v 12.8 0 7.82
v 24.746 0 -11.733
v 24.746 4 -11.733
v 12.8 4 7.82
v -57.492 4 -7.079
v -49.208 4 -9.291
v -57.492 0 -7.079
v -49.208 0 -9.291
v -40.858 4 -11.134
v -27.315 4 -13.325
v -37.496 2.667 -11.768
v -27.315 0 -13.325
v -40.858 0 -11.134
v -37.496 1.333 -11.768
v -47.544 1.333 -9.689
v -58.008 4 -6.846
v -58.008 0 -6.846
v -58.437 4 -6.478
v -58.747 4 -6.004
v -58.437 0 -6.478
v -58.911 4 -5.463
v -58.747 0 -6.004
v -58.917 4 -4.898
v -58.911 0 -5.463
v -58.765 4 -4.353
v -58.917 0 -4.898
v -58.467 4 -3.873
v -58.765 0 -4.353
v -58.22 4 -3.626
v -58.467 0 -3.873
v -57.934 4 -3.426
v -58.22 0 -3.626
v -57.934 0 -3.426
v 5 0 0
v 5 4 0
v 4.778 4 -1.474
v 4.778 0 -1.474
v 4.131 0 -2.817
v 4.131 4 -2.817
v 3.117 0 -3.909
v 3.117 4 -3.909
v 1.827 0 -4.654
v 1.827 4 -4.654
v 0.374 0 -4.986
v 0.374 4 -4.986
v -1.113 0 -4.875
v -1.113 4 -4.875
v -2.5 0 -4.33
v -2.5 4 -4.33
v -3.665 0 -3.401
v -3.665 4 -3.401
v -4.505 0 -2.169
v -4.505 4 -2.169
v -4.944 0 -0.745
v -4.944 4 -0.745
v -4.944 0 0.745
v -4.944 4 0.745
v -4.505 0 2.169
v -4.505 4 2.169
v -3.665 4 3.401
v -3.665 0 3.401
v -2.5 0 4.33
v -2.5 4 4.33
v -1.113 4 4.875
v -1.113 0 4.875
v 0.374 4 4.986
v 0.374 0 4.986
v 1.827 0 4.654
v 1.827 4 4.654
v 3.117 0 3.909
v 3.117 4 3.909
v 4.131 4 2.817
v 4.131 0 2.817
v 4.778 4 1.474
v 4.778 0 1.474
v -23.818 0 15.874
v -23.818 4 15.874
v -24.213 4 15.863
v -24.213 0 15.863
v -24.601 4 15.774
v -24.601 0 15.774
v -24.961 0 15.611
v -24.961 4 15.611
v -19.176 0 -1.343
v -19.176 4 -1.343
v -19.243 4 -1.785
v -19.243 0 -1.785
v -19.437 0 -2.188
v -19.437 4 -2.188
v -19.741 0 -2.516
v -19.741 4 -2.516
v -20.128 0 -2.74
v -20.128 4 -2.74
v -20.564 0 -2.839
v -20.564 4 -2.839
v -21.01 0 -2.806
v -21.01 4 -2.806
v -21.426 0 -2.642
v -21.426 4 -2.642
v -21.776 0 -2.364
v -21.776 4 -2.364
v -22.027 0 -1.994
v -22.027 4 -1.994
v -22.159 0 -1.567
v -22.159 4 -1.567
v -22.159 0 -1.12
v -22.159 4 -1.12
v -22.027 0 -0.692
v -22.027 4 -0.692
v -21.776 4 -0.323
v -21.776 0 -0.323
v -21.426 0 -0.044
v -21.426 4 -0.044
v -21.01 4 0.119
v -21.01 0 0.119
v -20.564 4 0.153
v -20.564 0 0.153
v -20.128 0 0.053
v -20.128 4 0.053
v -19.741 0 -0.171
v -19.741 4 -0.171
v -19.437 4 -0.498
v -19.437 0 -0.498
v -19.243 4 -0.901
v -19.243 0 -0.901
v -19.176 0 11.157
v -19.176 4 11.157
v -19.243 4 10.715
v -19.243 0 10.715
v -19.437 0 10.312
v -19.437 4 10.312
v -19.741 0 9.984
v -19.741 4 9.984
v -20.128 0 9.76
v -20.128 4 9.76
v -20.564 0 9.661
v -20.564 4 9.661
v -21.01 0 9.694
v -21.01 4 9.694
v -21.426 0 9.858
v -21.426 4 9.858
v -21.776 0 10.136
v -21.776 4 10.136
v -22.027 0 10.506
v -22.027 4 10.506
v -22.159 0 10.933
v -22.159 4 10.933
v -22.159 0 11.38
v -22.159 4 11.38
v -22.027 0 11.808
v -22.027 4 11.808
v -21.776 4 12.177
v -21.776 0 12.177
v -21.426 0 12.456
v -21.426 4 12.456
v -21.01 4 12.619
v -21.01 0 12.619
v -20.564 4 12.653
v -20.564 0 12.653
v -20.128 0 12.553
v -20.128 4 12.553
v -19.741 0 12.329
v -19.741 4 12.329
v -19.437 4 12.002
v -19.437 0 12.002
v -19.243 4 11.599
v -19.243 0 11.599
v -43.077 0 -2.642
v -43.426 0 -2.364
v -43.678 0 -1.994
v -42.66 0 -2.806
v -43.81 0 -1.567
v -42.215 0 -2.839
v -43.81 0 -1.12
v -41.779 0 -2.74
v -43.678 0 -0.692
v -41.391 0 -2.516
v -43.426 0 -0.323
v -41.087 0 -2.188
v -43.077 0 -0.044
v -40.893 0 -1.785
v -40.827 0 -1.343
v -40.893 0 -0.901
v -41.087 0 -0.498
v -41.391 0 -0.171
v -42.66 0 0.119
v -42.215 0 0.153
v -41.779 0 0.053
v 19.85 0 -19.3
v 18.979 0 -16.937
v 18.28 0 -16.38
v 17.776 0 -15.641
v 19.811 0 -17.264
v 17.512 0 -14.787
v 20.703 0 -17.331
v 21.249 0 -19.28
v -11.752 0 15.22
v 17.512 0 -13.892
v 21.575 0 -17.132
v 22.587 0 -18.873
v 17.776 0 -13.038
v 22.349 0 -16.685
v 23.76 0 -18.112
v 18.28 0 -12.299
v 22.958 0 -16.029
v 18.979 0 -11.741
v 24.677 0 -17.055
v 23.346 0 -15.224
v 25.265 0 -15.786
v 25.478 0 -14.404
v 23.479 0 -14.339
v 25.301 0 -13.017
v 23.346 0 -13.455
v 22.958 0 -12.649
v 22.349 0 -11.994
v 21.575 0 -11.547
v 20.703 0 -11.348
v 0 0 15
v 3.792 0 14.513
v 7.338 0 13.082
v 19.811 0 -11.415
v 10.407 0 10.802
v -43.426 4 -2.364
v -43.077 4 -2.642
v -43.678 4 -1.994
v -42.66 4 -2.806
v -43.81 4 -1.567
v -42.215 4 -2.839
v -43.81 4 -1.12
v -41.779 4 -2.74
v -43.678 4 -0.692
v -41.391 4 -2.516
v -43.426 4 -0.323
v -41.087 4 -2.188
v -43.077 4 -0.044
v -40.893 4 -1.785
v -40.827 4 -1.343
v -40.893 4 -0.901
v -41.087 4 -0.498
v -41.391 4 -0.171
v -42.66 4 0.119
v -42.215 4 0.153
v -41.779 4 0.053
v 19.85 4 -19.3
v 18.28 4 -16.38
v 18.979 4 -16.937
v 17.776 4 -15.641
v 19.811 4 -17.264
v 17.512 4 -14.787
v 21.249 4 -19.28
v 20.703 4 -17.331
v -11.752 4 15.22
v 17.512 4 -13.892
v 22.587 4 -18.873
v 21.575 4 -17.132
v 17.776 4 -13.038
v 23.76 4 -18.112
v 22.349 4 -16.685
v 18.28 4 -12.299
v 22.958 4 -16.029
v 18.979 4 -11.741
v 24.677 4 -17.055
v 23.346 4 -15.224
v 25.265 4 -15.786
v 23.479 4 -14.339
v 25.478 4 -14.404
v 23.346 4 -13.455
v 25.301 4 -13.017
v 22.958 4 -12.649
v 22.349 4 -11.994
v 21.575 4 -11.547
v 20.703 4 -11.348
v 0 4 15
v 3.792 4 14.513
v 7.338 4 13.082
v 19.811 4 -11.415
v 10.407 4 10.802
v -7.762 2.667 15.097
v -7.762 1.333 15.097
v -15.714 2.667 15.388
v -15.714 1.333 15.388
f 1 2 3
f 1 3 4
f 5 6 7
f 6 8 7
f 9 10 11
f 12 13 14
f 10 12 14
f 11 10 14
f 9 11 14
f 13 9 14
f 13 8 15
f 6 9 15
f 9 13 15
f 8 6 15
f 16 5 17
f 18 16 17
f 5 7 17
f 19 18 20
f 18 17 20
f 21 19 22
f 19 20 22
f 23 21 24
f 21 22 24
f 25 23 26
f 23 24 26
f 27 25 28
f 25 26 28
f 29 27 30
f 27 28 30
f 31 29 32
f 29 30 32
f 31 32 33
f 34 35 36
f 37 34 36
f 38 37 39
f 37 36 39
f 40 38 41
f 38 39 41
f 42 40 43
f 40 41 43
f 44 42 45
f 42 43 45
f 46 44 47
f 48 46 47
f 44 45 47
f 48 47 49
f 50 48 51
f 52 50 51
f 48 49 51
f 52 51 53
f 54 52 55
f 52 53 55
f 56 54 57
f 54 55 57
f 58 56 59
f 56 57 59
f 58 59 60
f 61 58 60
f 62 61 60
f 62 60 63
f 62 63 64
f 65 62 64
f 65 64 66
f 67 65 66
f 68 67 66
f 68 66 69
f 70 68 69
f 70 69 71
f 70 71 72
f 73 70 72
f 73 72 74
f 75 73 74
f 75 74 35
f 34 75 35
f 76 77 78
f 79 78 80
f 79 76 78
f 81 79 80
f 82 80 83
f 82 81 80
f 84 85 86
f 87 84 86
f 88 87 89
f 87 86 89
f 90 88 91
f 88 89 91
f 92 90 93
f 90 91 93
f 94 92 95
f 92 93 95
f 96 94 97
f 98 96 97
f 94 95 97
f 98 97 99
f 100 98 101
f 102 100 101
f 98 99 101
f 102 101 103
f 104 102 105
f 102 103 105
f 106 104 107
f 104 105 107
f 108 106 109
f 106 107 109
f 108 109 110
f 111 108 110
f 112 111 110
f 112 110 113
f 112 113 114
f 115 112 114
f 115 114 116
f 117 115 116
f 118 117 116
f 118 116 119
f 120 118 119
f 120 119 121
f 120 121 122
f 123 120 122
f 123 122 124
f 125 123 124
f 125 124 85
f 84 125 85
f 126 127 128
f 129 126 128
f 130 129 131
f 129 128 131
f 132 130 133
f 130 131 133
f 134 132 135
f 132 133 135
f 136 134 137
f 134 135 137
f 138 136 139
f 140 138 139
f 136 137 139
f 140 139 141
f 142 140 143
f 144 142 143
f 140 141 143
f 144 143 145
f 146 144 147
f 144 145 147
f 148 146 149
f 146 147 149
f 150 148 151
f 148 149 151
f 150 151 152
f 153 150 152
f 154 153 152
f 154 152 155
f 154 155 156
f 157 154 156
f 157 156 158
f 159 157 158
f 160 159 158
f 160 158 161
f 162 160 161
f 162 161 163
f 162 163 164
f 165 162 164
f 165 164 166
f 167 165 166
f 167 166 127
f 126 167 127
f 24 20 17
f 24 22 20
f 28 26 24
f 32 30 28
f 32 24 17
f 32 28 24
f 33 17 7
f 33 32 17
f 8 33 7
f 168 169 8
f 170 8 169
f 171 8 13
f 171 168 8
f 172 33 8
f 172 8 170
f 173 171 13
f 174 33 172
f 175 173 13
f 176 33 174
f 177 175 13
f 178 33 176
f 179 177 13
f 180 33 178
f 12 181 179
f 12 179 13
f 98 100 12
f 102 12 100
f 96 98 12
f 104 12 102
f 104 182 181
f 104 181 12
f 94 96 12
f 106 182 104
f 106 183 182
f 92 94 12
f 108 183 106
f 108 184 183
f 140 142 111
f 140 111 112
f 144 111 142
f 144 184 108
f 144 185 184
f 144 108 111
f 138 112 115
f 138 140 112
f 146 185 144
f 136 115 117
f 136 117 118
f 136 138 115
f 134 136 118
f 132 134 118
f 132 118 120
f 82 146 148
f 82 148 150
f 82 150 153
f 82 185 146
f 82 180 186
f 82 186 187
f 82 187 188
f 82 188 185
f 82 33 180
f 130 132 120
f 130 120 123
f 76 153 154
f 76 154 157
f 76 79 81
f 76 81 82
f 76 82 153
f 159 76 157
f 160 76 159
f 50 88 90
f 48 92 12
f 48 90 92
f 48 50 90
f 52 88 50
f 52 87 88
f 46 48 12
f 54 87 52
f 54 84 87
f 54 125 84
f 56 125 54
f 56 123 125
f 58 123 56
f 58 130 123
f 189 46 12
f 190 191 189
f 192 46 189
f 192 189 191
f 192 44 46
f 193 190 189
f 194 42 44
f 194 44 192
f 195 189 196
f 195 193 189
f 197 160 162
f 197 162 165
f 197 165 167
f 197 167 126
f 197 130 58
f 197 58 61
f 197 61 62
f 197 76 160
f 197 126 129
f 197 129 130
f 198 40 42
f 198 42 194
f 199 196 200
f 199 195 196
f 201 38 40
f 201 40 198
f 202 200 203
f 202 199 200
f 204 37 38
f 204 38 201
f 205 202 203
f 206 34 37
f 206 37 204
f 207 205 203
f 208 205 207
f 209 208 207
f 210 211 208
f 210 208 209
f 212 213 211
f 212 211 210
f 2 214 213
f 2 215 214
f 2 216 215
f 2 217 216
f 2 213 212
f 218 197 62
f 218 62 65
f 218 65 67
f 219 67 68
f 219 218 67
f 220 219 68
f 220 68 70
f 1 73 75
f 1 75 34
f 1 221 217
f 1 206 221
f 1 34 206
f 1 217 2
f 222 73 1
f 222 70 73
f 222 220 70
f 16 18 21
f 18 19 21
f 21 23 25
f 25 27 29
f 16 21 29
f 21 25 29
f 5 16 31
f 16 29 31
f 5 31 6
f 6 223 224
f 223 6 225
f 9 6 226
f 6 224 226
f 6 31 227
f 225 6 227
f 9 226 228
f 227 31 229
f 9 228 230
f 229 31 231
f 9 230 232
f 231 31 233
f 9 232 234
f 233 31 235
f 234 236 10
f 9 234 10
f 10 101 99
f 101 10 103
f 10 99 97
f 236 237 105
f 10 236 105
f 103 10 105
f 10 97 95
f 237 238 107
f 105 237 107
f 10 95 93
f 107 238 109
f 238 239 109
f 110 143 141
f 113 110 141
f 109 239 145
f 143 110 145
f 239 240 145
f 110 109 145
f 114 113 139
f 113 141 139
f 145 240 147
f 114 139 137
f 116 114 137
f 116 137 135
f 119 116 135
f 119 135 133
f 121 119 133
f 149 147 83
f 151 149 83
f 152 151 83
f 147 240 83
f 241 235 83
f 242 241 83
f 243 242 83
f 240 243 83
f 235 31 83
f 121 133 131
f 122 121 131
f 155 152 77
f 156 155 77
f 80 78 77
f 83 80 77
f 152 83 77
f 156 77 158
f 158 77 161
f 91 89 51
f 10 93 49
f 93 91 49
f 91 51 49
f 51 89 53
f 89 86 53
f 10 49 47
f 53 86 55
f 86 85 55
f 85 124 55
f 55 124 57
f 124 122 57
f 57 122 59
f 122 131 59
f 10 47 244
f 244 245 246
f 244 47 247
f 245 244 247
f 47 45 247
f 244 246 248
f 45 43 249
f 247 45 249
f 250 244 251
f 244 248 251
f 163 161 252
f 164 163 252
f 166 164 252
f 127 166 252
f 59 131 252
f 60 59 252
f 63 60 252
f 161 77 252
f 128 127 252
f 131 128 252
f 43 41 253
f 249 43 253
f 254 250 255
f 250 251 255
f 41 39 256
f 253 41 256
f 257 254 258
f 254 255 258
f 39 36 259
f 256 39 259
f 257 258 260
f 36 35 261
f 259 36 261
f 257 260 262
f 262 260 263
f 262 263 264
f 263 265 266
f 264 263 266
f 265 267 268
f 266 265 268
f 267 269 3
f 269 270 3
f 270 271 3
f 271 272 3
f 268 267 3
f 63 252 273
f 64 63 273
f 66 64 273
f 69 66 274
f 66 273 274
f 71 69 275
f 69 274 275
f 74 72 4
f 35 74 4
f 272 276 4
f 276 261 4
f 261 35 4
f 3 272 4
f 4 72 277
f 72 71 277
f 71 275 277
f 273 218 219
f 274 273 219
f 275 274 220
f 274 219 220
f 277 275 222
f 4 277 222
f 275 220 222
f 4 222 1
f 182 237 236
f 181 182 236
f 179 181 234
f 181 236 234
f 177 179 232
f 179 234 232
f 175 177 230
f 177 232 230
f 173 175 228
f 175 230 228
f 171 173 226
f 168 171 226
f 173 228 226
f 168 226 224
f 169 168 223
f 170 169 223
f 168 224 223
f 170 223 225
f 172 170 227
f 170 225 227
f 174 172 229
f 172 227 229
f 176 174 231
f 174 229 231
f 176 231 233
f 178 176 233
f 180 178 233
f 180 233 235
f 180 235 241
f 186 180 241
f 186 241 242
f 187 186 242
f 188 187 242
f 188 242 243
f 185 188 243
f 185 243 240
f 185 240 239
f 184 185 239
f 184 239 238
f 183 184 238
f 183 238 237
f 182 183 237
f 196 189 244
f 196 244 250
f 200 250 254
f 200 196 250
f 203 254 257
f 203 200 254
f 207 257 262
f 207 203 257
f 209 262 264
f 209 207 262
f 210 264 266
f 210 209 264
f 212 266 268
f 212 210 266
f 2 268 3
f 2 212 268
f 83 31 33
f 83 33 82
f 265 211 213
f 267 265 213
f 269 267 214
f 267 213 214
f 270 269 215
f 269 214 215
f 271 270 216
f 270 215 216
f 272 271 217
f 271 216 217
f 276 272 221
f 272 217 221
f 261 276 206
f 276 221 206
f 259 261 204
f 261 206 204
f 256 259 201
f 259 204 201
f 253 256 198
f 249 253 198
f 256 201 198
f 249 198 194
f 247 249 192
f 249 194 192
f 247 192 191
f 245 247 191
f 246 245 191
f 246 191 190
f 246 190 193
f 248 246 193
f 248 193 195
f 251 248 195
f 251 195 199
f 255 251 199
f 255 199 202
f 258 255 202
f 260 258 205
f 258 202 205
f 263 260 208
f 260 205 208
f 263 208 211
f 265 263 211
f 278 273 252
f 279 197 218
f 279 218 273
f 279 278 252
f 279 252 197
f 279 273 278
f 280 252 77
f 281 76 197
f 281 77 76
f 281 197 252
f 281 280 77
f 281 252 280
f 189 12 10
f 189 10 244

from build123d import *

# Parameters (mm, degrees)
SKETCH1_R           = 1.5
BOSS_EXTRUDE4_DEPTH = 4
SKETCH2_R           = 3
BOSS_EXTRUDE6_DEPTH = 4
CUT_EXTRUDE4_DEPTH  = 5.0000001
FILLET4_R           = 2
SKETCH7_R           = 5
SKETCH7_R_2         = 1.5
CUT_EXTRUDE3_DEPTH  = 10


with BuildPart() as part:
    # Sketch1 → Boss-Extrude4 (new body)
    with BuildSketch(Plane(origin=(0, 0, 0), x_dir=(1, 0, 0), z_dir=(0, 1, 0))):
        with BuildLine():
            add(Edge.make_bspline(
                [(0, 15), (-53.333333333, 15), (-97.583223813, -2.850327116), (-150.232513174, -43.74649777)],
                knots=[0, 0, 0, 0, 1, 1, 1, 1], degree=3))
            Line((-150.232513174, -43.74649777), (-144.167389057, -51.554673195))
            add(Edge.make_bspline(
                [(0, -15), (-49.211171611, -15), (-112.57781544, -27.016970802), (-144.167389057, -51.554673195)],
                knots=[0, 0, 0, 0, 1, 1, 1, 1], degree=3))
            ThreePointArc((0, -15), (15, 0), (0, 15))
        make_face()
        with Locations((-143.201136916, -44.647893409)):
            Circle(SKETCH1_R, mode=Mode.SUBTRACT)
    extrude(amount=BOSS_EXTRUDE4_DEPTH)

    # Sketch2 → Boss-Extrude6 (add)
    with BuildSketch(Plane.XZ):
        with BuildLine():
            Line((24.745562632, -11.732737533), (12.800284575, 7.820020128))
            ThreePointArc((12.800284575, 7.820020128), (14.439602983, 4.061756478), (15, 0))
            ThreePointArc((15, 0), (10.606601718, -10.606601718), (0, -15))
            add(Edge.make_bspline(
                [(0, -15), (-9.352958156, -15), (-18.426564807, -14.451032409), (-27.315109341, -13.325076493)],
                knots=[0, 0, 0, 0, 0.175367965, 0.175367965, 0.175367965, 0.175367965], degree=3))
            Line((-27.315109341, -13.325076493), (19.850447753, -19.299770983))
            ThreePointArc((19.850447753, -19.299770983), (24.676955739, -17.055197662), (24.745562632, -11.732737533))
        make_face()
        with Locations((20.478801107, -14.339410909)):
            Circle(SKETCH2_R, mode=Mode.SUBTRACT)
    extrude(amount=-BOSS_EXTRUDE6_DEPTH)

    # Sketch8 → Cut-Extrude4 (cut, through all)
    with BuildSketch(Plane(origin=(0, 4, 0), x_dir=(1, 0, 0), z_dir=(0, 1, 0))):
        Polygon((-61.93012476, 5.733160203), (-24.428772421, -15.918255665), (-81.418617577, -101.346773657), (-136.224202564, -112.686812452), (-181.390604498, 23.006558879), align=None)
    extrude(amount=-CUT_EXTRUDE4_DEPTH, mode=Mode.SUBTRACT)

    # Fillet4
    fillet4_edges = [part.edges().sort_by_distance(p)[0] for p in [
        (-61.93012476, 2, -5.733160203),
        (-24.428772421, 2, 15.918255665),
    ]]
    fillet(fillet4_edges, radius=FILLET4_R)

    # Sketch7 → Cut-Extrude3 (cut)
    with BuildSketch(Plane(origin=(0, 4, 0), x_dir=(1, 0, 0), z_dir=(0, 1, 0))):
        Circle(SKETCH7_R)
        with Locations((-42.326653454, 1.343293998)):
            Circle(SKETCH7_R_2)
        with Locations((-20.67601836, -11.156706002)):
            Circle(SKETCH7_R_2)
        with Locations((-20.67601836, 1.343293998)):
            Circle(SKETCH7_R_2)
    extrude(amount=-CUT_EXTRUDE3_DEPTH, mode=Mode.SUBTRACT)


solid = part.part
